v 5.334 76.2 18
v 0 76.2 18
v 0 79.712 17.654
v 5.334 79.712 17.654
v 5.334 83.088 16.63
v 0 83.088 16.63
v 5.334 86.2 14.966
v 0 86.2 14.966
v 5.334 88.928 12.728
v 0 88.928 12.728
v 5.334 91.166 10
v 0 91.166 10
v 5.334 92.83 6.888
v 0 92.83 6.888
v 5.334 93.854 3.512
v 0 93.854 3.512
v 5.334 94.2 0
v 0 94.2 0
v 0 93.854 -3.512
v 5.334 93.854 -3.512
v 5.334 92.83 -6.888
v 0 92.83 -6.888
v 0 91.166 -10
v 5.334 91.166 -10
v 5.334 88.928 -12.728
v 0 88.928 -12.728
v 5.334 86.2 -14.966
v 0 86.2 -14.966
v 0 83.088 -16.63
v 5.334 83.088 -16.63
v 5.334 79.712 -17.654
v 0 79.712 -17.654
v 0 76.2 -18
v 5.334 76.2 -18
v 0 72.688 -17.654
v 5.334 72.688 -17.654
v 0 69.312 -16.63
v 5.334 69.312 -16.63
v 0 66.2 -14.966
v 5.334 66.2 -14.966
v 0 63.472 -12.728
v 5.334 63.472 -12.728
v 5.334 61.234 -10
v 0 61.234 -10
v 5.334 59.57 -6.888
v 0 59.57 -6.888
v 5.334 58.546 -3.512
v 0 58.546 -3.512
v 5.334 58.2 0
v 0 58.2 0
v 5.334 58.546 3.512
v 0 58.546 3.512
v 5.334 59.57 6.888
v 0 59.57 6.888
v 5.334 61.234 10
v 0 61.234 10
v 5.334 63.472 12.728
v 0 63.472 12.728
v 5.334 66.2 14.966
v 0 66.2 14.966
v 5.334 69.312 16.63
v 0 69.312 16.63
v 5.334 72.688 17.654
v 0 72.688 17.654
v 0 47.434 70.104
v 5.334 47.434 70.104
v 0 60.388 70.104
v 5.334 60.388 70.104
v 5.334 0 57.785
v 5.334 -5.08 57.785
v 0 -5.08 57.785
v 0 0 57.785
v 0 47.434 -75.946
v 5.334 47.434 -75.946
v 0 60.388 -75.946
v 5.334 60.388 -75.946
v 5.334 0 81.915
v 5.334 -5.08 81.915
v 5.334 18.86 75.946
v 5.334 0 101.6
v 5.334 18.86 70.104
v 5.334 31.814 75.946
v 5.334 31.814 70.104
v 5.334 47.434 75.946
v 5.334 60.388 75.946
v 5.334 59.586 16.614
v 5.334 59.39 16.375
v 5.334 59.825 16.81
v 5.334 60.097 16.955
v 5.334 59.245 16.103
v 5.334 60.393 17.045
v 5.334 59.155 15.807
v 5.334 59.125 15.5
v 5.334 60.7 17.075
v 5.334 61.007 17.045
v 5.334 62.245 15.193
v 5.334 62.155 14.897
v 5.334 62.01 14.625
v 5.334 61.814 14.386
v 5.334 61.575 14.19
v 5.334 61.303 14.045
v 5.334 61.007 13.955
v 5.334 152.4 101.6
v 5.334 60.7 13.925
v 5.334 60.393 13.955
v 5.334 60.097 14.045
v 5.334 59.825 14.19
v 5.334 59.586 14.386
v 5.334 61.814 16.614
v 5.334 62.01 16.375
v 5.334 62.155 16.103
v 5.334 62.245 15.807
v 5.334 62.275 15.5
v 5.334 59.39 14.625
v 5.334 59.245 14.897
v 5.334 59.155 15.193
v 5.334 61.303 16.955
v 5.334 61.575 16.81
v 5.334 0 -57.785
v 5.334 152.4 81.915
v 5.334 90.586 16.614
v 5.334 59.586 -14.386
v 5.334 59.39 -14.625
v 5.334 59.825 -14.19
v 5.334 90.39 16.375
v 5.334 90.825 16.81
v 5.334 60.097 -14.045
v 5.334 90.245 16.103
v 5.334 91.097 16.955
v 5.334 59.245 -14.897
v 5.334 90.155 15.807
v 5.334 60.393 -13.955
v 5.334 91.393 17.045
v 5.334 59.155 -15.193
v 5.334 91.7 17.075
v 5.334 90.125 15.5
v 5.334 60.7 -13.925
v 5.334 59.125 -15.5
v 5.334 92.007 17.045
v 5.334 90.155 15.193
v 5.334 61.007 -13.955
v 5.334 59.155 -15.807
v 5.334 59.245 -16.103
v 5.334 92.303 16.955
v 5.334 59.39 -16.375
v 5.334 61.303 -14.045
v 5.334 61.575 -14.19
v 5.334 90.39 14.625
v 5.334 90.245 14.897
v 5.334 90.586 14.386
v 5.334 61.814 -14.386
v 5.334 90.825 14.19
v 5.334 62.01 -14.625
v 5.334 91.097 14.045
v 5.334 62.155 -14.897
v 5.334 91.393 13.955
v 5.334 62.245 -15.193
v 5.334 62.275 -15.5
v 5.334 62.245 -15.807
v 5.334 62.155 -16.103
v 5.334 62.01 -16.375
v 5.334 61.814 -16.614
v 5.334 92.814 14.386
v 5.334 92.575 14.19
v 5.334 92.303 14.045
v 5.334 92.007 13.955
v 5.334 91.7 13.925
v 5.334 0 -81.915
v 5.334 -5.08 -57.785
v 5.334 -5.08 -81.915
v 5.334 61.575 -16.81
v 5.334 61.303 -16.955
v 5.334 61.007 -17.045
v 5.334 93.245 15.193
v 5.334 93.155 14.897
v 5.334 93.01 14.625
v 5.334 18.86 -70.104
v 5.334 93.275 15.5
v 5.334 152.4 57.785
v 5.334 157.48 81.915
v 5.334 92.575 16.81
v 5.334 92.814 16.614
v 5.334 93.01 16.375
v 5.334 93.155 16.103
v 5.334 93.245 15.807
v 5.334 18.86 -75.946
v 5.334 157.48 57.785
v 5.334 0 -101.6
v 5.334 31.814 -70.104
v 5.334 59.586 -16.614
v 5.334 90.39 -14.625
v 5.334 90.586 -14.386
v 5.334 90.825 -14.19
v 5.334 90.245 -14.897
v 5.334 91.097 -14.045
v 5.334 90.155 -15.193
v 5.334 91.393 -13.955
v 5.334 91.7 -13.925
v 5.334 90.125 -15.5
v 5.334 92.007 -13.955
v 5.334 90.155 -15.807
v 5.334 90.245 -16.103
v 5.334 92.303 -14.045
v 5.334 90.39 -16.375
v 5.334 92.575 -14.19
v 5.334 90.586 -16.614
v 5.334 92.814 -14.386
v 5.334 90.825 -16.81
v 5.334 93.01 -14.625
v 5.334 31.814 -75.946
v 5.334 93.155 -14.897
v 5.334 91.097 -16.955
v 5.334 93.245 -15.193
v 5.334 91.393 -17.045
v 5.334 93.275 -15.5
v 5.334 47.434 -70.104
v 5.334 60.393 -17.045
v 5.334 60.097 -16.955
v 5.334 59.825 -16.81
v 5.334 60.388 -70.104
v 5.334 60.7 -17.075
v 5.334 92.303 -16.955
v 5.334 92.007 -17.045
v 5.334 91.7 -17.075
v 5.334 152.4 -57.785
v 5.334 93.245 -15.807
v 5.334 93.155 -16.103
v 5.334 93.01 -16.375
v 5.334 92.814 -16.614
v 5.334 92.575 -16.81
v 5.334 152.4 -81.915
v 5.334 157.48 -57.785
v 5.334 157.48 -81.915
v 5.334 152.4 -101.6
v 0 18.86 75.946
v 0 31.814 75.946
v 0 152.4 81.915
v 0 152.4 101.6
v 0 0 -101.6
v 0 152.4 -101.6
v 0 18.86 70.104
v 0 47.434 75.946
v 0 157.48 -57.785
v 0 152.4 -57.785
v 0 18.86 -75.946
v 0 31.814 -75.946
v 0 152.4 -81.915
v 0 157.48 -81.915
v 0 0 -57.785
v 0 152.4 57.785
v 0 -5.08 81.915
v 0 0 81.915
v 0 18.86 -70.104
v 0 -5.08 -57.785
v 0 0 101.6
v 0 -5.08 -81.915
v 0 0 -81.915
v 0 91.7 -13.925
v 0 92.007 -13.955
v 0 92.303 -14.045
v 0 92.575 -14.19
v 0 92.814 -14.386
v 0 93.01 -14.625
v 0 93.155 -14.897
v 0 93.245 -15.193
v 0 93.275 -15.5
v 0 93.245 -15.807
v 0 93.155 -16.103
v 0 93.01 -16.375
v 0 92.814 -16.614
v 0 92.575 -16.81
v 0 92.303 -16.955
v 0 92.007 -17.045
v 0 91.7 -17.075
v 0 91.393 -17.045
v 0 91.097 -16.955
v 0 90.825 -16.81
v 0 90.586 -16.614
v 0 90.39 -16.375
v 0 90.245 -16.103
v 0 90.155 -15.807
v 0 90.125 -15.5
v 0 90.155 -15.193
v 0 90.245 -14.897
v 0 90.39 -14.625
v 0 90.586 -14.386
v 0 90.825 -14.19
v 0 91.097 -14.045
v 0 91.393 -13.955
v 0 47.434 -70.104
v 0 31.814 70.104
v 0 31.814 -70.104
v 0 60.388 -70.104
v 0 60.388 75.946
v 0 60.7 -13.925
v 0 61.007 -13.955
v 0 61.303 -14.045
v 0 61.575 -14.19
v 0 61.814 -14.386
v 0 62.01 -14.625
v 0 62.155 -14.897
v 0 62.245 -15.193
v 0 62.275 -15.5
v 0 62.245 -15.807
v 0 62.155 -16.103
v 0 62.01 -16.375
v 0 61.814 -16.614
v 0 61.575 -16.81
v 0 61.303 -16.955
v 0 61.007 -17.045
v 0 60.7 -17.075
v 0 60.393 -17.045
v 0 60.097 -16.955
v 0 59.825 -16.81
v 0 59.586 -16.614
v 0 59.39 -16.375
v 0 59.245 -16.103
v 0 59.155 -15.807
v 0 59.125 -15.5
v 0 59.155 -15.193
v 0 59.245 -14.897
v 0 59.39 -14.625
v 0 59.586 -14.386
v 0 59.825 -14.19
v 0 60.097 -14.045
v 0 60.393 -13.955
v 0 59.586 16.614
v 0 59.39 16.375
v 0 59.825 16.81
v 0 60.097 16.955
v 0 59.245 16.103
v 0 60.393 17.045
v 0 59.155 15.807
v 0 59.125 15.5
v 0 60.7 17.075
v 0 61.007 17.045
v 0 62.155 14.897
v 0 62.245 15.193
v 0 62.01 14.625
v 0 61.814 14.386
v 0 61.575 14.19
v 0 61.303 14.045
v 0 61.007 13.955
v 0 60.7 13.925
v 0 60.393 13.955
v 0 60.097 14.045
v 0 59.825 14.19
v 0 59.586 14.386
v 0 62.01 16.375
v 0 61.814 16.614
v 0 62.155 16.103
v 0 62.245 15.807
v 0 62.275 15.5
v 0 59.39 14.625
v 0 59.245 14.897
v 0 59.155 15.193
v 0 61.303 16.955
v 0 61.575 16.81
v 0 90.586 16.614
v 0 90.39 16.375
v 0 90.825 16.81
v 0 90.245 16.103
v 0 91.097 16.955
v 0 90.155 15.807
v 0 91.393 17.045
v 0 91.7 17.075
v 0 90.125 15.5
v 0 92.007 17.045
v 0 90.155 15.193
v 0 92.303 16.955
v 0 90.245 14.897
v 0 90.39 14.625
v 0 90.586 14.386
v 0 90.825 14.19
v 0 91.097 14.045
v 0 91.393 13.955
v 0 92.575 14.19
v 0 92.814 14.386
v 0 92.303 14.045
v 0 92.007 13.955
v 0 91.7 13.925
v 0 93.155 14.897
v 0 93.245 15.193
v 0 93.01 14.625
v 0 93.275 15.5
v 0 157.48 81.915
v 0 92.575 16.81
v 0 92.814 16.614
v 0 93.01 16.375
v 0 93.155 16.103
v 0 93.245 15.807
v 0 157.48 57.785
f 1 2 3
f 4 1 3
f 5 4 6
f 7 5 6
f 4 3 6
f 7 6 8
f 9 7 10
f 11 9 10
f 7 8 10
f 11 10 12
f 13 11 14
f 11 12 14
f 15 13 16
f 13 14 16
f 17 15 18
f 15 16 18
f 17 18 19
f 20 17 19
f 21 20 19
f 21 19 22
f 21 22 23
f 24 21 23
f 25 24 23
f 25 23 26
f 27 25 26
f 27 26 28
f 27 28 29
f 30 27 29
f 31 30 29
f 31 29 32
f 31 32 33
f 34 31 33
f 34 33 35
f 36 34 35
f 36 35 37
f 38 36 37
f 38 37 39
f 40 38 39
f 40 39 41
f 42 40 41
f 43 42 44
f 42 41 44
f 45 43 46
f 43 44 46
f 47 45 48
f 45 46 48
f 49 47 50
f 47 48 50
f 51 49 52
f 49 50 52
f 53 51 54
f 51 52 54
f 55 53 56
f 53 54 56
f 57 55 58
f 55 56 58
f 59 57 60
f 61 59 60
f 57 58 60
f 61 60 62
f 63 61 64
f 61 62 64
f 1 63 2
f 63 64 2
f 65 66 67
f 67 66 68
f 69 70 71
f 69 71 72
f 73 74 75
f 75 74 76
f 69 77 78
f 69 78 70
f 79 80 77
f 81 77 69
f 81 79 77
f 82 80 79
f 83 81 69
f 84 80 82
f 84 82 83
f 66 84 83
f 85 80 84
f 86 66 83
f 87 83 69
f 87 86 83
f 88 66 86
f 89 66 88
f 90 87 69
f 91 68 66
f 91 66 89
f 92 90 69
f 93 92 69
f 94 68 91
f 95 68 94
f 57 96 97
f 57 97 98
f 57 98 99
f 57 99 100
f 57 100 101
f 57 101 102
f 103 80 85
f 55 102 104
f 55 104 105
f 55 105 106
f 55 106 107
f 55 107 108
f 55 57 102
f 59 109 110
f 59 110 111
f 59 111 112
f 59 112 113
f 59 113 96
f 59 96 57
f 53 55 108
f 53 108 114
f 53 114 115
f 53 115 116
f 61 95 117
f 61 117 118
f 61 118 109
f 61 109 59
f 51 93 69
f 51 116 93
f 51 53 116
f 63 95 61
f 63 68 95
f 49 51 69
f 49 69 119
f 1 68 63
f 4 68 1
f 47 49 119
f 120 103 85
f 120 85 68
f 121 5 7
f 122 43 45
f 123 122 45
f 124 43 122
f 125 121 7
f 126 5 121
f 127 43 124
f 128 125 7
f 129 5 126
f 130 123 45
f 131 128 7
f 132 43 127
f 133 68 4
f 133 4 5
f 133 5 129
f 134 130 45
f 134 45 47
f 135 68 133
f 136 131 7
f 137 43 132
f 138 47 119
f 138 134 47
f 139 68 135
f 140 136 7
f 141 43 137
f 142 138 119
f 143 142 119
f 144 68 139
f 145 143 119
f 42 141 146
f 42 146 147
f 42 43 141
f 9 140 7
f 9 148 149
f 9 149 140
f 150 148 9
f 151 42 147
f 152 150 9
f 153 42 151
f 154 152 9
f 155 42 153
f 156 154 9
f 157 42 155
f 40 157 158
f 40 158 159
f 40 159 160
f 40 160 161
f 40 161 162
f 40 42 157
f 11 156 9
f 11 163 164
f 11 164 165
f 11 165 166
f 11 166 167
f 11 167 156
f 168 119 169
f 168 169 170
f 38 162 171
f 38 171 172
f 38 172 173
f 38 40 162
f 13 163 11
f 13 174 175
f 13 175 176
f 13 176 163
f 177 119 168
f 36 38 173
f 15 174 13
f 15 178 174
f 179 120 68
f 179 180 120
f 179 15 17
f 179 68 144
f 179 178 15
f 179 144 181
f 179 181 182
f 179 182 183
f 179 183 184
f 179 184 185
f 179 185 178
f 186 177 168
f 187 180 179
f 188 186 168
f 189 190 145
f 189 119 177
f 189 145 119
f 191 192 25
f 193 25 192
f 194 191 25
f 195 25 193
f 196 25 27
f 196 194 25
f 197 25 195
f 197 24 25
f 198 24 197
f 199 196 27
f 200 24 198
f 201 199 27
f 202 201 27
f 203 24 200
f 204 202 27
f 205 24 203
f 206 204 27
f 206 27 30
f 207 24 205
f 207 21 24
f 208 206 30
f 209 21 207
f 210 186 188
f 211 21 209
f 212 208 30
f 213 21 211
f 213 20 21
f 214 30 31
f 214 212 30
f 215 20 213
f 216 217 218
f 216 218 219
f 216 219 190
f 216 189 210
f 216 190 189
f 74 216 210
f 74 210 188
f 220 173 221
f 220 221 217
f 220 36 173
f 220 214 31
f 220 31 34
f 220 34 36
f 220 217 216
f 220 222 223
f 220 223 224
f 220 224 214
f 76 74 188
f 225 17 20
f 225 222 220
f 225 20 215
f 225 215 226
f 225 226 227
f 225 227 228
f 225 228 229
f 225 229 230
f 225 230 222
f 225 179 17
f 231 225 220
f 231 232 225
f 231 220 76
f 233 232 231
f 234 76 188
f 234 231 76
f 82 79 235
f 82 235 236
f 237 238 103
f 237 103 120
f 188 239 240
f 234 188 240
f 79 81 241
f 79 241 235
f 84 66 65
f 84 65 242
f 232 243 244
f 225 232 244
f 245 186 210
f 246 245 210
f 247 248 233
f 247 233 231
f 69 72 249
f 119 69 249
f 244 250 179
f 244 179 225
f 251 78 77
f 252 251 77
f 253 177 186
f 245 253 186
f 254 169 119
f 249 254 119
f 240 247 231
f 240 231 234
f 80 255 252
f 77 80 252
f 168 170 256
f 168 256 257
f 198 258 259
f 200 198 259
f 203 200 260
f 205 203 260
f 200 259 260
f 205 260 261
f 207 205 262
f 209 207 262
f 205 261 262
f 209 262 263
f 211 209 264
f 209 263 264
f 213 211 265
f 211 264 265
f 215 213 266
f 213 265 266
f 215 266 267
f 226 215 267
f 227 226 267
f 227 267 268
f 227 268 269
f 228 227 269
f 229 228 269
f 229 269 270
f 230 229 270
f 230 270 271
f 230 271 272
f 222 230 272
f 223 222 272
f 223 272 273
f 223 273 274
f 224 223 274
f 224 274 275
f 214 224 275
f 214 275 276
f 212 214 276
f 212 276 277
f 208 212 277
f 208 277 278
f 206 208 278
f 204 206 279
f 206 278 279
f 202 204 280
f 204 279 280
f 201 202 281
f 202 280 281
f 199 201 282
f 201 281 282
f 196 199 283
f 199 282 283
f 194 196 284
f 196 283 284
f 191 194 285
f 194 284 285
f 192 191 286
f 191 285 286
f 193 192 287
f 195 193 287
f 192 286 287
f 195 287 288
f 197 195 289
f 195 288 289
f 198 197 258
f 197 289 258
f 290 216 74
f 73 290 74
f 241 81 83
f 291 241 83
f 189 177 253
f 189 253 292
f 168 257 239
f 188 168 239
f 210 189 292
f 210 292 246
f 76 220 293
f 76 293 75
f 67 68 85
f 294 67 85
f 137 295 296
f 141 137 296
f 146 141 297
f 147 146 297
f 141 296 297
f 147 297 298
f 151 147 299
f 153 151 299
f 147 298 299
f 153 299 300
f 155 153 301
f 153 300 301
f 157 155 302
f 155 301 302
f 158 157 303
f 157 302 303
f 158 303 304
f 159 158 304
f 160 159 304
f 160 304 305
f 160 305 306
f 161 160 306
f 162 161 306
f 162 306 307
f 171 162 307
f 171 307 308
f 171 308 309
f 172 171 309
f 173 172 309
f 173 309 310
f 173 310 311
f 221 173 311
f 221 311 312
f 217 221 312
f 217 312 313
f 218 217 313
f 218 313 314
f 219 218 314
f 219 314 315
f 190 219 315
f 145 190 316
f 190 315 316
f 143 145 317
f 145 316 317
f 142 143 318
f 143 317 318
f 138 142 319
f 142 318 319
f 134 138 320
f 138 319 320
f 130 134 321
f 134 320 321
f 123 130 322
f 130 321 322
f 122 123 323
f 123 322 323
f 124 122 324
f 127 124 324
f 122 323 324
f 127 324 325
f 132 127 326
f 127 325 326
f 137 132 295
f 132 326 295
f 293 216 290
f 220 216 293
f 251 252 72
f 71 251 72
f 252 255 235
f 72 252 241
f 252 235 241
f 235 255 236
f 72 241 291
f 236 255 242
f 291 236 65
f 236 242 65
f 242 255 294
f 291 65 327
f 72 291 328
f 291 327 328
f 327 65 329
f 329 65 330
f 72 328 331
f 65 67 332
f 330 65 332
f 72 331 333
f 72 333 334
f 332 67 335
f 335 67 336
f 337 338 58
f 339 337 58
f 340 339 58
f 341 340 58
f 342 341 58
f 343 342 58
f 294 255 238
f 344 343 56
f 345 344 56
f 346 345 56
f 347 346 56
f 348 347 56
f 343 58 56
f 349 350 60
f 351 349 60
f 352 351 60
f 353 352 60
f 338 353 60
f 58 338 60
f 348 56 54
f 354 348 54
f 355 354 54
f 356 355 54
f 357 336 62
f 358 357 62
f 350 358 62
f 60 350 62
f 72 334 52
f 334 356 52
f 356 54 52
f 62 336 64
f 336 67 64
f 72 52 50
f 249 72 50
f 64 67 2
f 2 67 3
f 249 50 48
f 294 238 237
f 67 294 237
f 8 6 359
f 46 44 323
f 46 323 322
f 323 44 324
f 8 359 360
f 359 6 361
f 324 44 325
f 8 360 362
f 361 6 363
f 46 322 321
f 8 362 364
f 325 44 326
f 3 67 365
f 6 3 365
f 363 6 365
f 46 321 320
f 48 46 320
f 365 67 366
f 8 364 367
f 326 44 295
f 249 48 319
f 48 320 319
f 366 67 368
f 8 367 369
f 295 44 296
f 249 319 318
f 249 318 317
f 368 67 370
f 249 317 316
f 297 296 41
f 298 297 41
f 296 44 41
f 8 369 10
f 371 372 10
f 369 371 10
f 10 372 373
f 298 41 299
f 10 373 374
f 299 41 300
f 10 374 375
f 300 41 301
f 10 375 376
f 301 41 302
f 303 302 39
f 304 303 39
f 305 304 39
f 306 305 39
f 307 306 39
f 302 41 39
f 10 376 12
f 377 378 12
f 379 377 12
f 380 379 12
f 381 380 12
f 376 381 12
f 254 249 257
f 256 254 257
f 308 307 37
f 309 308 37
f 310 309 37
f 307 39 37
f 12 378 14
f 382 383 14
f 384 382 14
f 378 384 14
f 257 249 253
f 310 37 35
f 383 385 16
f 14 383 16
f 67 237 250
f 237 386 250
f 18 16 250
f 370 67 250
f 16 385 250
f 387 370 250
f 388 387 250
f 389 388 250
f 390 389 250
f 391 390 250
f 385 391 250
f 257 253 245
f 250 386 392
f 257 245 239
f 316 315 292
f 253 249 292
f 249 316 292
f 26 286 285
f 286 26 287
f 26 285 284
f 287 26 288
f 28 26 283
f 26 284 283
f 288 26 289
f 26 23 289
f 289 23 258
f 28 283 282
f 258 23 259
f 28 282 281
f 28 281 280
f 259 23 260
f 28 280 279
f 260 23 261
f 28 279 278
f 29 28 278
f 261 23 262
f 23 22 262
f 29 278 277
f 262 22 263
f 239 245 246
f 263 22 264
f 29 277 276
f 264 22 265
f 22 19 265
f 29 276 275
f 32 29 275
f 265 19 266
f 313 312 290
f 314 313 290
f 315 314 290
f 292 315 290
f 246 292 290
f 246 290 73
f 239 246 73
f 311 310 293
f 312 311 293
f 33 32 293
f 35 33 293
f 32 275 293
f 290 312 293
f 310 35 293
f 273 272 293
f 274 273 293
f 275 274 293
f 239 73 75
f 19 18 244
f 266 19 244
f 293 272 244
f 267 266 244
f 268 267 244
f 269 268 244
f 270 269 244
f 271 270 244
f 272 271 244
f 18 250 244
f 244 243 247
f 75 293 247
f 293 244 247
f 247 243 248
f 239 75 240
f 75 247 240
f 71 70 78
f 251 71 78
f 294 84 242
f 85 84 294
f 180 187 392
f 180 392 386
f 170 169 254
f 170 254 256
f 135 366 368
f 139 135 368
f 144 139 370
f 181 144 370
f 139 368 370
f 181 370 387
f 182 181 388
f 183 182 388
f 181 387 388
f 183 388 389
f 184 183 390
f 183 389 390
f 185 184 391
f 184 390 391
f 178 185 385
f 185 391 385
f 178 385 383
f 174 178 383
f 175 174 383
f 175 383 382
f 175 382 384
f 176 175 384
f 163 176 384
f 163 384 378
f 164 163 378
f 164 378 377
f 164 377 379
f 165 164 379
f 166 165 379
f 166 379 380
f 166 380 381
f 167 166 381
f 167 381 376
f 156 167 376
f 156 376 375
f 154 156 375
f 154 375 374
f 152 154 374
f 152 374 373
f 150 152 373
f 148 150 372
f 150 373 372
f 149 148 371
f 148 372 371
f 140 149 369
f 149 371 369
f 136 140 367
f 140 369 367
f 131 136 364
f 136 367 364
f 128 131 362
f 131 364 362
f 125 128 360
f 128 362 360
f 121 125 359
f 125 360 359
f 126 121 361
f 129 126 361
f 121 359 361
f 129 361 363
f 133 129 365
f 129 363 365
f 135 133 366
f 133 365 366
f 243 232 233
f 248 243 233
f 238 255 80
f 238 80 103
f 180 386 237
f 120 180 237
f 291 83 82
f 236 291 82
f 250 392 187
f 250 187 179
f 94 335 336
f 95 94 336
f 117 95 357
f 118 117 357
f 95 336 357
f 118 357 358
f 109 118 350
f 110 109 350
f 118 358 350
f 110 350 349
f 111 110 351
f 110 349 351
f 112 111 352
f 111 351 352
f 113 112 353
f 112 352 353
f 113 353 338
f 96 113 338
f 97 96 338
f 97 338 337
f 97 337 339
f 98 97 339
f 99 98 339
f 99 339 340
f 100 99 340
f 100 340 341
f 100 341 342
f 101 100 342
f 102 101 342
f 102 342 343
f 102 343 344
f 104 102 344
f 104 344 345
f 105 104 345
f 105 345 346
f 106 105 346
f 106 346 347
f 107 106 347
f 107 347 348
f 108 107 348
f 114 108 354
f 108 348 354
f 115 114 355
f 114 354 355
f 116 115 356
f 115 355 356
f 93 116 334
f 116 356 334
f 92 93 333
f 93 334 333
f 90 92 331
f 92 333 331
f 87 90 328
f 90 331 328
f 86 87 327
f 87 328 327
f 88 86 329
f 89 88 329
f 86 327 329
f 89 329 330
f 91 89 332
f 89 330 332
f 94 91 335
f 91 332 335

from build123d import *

# Parameters (mm, degrees)
SKETCH1_W               = 203.2
SKETCH1_H               = 152.4
BOSS_EXTRUDE2_DEPTH     = 5.334
SKETCH2_R               = 18
SKETCH2_R_2             = 1.575
CUT_EXTRUDE1_DEPTH      = 184.239656068
SKETCH3_W               = 24.13
SKETCH3_H               = 5.08
BOSS_EXTRUDE3_DEPTH     = 5.334
SKETCH4_W               = 5.842
SKETCH4_H               = 12.954
CUT_EXTRUDE2_DEPTH      = 184.239656068
MIRROR3_COPY_1_SKETCH_W = 24.13
MIRROR3_COPY_1_SKETCH_H = 5.08
MIRROR3_COPY_1_DEPTH    = 5.334


with BuildPart() as part:
    # Sketch1 → Boss-Extrude2 (new body)
    with BuildSketch(Plane(origin=(0, 0, 0), x_dir=(0, 0, -1), z_dir=(1, 0, 0))):
        with Locations((0, 76.2)):
            Rectangle(SKETCH1_W, SKETCH1_H)
    extrude(amount=BOSS_EXTRUDE2_DEPTH)

    # Sketch2 → Cut-Extrude1 (cut, through all)
    with BuildSketch(Plane.ZY):
        with Locations((0, 76.2)):
            Circle(SKETCH2_R)
        with Locations((-15.5, 91.7)):
            Circle(SKETCH2_R_2)
        with Locations((15.5, 91.7)):
            Circle(SKETCH2_R_2)
        with Locations((15.5, 60.7)):
            Circle(SKETCH2_R_2)
        with Locations((-15.5, 60.7)):
            Circle(SKETCH2_R_2)
    extrude(amount=-CUT_EXTRUDE1_DEPTH, mode=Mode.SUBTRACT)

    # Sketch3 → Boss-Extrude3 (add, through all)
    with BuildSketch(Plane(origin=(5.334, 0, 0), x_dir=(0, 0, -1), z_dir=(1, 0, 0))):
        with Locations((69.85, -2.54)):
            Rectangle(SKETCH3_W, SKETCH3_H)
    boss_extrude3 = extrude(amount=-BOSS_EXTRUDE3_DEPTH)

    # Mirror1: Boss-Extrude3 across plane
    add(boss_extrude3.mirror(Plane.XY))

    # Sketch4 → Cut-Extrude2 (cut, through all)
    with BuildSketch(Plane(origin=(5.334, 0, 0), x_dir=(0, 0, -1), z_dir=(1, 0, 0))):
        with Locations((73.025, 25.3365)):
            Rectangle(SKETCH4_W, SKETCH4_H)
        with Locations((73.025, 53.9115)):
            Rectangle(SKETCH4_W, SKETCH4_H)
    cut_extrude2 = extrude(amount=-CUT_EXTRUDE2_DEPTH, mode=Mode.SUBTRACT)

    # Mirror2: Cut-Extrude2 across plane
    add(cut_extrude2.mirror(Plane.XY), mode=Mode.SUBTRACT)

    # Mirror3: Boss-Extrude3 across plane
    add(boss_extrude3.mirror(Plane(origin=(0, 76.2, 0), x_dir=(0, 0, 1), z_dir=(0, -1, 0))))

    # Mirror3 copy 1 sketch → Mirror3 copy 1 (add, through all)
    with BuildSketch(Plane(origin=(5.334, 152.4, 0), x_dir=(0, 0, 1), z_dir=(1, 0, 0))):
        with Locations((69.85, -2.54)):
            Rectangle(MIRROR3_COPY_1_SKETCH_W, MIRROR3_COPY_1_SKETCH_H)
    extrude(amount=-MIRROR3_COPY_1_DEPTH)


solid = part.part
